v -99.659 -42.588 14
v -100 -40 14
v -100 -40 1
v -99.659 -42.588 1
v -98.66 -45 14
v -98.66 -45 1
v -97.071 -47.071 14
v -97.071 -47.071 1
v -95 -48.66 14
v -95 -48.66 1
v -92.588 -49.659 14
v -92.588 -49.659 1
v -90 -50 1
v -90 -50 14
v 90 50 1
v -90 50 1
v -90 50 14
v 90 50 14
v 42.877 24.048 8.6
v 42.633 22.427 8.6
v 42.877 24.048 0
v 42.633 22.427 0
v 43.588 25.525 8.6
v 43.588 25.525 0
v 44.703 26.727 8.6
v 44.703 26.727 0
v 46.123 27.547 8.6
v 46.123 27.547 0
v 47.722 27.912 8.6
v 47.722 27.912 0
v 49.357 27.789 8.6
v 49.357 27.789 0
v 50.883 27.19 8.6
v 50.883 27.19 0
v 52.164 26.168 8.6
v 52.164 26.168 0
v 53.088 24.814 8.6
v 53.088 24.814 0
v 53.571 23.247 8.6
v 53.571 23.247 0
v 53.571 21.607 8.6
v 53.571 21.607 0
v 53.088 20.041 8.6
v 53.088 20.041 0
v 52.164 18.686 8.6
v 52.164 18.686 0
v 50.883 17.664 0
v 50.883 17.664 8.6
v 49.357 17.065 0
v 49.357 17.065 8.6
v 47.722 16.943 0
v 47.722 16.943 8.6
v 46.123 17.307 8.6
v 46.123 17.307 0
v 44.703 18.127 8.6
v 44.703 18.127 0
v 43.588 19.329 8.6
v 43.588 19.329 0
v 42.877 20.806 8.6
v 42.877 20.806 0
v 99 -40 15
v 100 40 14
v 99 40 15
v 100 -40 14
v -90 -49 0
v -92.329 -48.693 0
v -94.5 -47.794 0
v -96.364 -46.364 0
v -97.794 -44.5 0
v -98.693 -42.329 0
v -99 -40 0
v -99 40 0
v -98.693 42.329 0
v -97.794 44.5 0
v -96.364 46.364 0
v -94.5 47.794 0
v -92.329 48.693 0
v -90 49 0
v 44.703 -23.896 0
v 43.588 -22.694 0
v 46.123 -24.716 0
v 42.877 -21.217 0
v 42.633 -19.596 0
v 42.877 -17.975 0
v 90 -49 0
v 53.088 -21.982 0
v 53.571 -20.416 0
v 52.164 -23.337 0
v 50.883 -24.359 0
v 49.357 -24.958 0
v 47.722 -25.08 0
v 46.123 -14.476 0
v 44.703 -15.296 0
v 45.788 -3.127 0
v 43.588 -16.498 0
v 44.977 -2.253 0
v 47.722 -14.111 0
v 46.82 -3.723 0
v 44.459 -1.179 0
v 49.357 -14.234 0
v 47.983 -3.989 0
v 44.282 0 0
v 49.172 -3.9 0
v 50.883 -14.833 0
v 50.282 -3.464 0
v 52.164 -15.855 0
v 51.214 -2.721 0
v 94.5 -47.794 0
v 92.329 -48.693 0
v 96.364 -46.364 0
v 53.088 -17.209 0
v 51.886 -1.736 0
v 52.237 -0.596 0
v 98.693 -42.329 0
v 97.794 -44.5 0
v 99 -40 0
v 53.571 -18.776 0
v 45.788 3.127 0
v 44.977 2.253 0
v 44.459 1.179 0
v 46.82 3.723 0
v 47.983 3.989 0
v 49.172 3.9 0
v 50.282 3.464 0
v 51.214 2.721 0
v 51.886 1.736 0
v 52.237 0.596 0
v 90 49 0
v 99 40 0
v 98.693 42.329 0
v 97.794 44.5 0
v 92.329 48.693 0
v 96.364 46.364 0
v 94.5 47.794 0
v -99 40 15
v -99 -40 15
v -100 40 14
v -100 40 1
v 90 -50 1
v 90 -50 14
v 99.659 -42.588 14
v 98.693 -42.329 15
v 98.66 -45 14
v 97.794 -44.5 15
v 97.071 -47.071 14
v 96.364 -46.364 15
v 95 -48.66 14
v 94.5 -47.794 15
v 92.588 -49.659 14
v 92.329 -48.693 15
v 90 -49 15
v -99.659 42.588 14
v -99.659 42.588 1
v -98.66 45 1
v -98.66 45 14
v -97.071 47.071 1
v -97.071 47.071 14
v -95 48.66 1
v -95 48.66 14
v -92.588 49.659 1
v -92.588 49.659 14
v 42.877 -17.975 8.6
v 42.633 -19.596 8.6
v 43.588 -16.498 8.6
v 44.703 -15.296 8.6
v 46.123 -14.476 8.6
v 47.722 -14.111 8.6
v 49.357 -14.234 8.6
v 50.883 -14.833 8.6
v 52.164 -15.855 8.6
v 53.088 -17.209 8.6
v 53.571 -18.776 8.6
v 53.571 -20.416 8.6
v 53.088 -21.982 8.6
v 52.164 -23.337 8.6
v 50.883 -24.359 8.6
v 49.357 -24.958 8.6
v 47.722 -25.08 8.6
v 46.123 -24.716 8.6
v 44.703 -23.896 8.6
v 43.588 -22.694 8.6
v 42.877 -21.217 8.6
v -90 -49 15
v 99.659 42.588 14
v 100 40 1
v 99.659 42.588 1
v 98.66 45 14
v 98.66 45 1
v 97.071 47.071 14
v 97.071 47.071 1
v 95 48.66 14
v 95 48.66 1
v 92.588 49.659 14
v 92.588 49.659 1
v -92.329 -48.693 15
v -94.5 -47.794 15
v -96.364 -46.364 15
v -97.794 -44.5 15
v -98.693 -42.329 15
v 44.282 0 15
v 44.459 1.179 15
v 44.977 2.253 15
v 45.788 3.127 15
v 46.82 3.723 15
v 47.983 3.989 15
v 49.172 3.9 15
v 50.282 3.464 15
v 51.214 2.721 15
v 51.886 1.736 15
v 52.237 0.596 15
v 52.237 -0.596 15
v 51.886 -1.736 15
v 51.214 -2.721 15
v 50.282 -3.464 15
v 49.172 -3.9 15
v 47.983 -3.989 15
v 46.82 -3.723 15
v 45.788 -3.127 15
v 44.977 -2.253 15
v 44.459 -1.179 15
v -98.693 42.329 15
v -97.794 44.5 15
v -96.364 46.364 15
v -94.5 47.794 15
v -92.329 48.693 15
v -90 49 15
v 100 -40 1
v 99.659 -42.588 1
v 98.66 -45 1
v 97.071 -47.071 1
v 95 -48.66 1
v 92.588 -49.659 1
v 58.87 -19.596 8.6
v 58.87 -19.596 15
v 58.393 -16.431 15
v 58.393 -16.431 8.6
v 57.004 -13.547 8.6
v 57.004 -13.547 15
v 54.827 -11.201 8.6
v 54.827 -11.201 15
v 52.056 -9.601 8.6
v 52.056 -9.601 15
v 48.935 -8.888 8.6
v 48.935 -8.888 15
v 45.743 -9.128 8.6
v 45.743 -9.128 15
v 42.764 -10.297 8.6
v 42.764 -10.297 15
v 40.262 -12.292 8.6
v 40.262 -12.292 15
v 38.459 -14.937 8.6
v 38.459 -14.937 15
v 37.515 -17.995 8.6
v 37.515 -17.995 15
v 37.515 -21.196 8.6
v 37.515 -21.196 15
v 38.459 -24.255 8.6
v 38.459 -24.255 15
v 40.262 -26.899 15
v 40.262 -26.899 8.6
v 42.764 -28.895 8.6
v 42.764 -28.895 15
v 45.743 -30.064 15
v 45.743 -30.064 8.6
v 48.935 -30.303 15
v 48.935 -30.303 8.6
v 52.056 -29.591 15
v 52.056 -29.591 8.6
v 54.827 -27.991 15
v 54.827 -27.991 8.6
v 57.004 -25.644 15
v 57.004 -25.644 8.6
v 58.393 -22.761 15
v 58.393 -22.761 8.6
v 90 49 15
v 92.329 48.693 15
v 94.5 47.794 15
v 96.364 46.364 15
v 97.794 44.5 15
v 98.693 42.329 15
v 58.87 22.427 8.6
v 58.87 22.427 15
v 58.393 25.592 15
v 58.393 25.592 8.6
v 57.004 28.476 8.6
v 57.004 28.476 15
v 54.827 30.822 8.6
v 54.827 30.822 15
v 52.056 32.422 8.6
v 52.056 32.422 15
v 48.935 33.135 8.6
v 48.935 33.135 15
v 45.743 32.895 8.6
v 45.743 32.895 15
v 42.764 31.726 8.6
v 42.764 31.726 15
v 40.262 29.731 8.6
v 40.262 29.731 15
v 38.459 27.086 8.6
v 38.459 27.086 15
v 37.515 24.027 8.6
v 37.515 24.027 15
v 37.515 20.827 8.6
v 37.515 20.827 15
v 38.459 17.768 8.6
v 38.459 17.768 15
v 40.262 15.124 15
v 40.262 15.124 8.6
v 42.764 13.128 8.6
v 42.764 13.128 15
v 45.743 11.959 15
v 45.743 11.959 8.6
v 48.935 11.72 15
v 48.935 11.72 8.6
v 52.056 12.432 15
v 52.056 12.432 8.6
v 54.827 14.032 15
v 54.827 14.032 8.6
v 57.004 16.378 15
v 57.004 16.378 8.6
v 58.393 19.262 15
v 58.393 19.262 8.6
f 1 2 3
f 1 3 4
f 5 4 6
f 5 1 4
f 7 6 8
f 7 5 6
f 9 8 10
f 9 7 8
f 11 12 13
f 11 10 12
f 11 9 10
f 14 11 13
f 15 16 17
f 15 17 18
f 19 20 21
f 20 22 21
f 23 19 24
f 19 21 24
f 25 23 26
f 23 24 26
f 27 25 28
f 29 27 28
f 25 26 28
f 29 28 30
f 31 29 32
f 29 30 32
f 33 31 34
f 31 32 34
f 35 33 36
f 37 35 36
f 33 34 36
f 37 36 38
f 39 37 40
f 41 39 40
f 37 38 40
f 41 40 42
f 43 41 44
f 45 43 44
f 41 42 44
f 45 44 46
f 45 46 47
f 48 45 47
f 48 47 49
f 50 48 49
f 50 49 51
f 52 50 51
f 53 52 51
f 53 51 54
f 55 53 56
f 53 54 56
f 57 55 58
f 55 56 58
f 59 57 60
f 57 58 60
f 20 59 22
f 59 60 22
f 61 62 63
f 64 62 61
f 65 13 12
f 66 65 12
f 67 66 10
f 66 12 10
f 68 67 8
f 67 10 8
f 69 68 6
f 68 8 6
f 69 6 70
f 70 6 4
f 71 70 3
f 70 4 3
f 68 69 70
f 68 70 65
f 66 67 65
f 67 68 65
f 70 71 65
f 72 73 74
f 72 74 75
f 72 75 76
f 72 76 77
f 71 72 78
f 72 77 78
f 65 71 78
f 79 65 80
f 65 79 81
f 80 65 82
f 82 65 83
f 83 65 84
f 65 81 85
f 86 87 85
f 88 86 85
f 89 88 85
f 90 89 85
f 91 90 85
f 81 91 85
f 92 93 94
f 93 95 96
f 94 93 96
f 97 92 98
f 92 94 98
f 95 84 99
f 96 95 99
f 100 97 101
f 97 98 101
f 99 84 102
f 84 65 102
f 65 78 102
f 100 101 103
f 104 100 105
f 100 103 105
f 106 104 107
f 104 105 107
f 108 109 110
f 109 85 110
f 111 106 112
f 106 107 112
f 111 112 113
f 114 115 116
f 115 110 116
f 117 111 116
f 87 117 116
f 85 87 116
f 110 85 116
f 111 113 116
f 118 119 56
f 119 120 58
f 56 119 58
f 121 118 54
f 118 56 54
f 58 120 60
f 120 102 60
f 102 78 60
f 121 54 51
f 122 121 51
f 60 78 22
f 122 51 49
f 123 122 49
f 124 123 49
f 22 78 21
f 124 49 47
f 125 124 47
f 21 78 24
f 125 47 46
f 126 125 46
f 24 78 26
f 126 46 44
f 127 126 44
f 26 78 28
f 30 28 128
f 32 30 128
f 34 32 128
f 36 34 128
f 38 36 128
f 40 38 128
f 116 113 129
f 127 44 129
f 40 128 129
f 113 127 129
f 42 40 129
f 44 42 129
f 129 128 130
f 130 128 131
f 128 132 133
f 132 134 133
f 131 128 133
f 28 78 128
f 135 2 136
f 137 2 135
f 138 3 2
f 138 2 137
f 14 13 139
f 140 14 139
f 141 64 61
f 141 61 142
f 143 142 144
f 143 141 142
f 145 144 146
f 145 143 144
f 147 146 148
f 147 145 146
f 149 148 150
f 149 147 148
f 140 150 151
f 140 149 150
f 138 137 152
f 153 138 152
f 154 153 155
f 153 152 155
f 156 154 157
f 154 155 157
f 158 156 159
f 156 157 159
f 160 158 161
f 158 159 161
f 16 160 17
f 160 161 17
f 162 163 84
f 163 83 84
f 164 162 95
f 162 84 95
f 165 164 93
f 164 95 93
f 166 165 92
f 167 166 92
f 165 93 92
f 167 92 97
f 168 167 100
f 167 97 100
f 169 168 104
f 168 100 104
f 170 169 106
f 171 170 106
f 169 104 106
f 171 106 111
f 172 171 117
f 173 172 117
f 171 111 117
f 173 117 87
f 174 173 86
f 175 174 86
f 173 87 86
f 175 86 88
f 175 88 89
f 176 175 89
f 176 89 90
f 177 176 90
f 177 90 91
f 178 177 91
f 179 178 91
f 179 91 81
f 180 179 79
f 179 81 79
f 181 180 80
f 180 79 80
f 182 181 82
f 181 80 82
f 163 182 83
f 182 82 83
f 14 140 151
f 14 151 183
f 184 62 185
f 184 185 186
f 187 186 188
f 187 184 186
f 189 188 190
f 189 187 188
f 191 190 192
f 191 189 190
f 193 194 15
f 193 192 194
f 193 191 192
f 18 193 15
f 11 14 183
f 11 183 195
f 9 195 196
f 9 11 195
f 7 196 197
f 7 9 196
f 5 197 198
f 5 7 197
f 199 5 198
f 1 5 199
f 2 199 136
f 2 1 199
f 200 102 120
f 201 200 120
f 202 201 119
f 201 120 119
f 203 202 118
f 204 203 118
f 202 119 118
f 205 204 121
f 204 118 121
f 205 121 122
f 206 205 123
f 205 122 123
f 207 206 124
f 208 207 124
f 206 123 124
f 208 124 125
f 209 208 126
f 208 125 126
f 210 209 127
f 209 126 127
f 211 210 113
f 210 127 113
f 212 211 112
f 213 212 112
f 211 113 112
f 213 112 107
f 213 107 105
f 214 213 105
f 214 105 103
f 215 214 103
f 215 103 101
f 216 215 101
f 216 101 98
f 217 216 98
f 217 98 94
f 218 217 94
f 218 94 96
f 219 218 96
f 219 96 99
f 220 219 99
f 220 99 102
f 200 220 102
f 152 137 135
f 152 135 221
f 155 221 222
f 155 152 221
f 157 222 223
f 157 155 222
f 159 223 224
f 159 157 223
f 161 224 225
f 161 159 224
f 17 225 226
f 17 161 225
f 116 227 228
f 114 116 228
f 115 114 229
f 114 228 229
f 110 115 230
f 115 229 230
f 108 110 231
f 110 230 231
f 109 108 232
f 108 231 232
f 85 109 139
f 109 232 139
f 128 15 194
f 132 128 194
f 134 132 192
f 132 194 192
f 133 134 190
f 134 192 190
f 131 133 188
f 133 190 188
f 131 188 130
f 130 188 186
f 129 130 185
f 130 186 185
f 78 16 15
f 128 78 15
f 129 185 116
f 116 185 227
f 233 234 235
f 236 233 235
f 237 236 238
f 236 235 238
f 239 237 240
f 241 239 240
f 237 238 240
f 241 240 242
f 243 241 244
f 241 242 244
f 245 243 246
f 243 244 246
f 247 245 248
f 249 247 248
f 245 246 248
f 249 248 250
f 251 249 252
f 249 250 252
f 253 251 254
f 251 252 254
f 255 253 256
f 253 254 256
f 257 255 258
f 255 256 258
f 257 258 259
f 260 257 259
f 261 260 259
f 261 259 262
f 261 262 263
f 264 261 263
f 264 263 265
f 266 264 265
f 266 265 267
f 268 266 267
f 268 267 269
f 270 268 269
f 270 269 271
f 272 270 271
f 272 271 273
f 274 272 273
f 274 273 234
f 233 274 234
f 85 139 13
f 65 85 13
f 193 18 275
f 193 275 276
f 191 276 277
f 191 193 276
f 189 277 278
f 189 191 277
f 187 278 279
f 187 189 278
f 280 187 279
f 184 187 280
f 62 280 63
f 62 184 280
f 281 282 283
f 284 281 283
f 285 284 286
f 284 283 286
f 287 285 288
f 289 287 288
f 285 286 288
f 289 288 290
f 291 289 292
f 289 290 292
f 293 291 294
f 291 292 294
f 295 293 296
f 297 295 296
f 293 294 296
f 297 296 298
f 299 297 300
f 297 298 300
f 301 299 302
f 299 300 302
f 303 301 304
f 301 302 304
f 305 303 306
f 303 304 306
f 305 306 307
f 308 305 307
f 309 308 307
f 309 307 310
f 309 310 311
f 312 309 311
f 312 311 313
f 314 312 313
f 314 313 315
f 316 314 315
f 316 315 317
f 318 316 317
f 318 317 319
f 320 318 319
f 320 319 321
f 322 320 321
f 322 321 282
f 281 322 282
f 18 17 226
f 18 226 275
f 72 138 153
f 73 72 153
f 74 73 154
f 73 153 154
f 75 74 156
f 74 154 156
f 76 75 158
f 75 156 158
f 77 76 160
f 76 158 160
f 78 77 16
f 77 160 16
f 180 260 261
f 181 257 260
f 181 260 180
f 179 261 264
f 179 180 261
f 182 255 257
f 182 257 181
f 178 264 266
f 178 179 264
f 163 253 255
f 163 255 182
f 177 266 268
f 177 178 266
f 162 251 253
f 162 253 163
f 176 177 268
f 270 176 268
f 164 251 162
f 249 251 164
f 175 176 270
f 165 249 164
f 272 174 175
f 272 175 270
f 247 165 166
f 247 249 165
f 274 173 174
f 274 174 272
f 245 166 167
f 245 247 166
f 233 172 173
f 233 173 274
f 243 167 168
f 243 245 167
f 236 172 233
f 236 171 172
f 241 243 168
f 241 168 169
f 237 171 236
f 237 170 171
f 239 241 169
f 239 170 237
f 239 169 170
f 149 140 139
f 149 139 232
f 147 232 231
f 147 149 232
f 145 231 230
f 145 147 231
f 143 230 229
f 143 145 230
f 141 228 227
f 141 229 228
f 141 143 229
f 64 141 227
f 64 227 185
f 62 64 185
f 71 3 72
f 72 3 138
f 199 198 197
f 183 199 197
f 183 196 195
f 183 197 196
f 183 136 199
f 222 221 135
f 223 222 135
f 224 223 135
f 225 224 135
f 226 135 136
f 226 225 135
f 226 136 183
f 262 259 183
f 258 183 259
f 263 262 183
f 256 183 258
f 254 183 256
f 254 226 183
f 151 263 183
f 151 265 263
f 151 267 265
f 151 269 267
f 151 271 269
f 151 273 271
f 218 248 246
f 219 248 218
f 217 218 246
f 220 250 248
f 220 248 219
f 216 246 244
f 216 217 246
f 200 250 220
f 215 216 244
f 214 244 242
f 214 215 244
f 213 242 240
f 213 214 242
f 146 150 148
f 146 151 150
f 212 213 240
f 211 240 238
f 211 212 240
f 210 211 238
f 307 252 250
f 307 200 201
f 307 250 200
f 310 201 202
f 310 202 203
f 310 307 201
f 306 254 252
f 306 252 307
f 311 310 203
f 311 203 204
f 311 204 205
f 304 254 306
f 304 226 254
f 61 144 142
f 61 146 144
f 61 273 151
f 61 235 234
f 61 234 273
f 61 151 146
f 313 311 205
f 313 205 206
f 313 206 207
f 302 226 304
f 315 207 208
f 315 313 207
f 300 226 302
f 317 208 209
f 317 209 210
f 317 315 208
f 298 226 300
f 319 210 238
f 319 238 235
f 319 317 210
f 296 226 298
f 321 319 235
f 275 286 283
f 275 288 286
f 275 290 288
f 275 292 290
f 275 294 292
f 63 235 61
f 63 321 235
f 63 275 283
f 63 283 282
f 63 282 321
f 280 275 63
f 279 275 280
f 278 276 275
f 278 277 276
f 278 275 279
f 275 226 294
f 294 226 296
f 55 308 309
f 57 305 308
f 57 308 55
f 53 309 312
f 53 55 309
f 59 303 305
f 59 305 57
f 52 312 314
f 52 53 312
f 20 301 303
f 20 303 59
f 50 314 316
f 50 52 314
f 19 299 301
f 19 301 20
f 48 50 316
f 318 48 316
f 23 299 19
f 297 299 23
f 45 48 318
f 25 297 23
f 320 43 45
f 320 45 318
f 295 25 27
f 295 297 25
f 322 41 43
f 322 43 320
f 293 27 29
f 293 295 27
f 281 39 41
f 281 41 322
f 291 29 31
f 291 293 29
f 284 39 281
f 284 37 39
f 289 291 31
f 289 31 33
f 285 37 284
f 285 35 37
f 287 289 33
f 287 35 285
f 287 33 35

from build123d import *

# Parameters (mm, degrees)
SKETCH1_W                                = 200
SKETCH1_H                                = 100
BOSS_EXTRUDE1_DEPTH                      = 15
FILLET1_R                                = 10
CBORE_FOR_M10_HEX_HEAD_BOLT1_D           = 11
CBORE_FOR_M10_HEX_HEAD_BOLT1_CBORE_D     = 21.475
CBORE_FOR_M10_HEX_HEAD_BOLT1_CBORE_DEPTH = 6.4
F_8_0MM_DOWEL_HOLE1_D                    = 8
CHAMFER1_SIZE                            = 1


with BuildPart() as part:
    # Sketch1 → Boss-Extrude1 (new body)
    with BuildSketch(Plane.XY):
        Rectangle(SKETCH1_W, SKETCH1_H)
    extrude(amount=BOSS_EXTRUDE1_DEPTH)

    # Fillet1
    fillet1_edges = [part.edges().sort_by_distance(p)[0] for p in [
        (100, -50, 7.5),
        (-100, -50, 7.5),
        (-100, 50, 7.5),
        (100, 50, 7.5),
    ]]
    fillet(fillet1_edges, radius=FILLET1_R)

    # CBORE for M10 Hex Head Bolt1 (through all)
    with Locations(Plane.XY.offset(15)):
        with Locations((48.132684833, 22.427148815), (48.132684833, -19.595814413)):
            CounterBoreHole(CBORE_FOR_M10_HEX_HEAD_BOLT1_D / 2, CBORE_FOR_M10_HEX_HEAD_BOLT1_CBORE_D / 2, CBORE_FOR_M10_HEX_HEAD_BOLT1_CBORE_DEPTH)

    # Ø8.0mm Dowel Hole1 (through all)
    with Locations(Plane.XY.offset(15)):
        with Locations((48.281702433, 0)):
            Hole(F_8_0MM_DOWEL_HOLE1_D / 2)

    # Chamfer1
    chamfer1_edges = [part.edges().sort_by_distance(p)[0] for p in [
        (0, 50, 0),
        (0, 50, 15),
        (100, 0, 0),
        (0, -50, 0),
        (-100, 0, 0),
        (-97.071067812, -47.071067812, 0),
        (-97.071067812, 47.071067812, 0),
        (97.071067812, -47.071067812, 0),
        (97.071067812, 47.071067812, 0),
        (100, 0, 15),
        (-100, 0, 15),
        (0, -50, 15),
        (-97.071067812, -47.071067812, 15),
        (-97.071067812, 47.071067812, 15),
        (97.071067812, -47.071067812, 15),
        (97.071067812, 47.071067812, 15),
    ]]
    chamfer(chamfer1_edges, length=CHAMFER1_SIZE)


solid = part.part
